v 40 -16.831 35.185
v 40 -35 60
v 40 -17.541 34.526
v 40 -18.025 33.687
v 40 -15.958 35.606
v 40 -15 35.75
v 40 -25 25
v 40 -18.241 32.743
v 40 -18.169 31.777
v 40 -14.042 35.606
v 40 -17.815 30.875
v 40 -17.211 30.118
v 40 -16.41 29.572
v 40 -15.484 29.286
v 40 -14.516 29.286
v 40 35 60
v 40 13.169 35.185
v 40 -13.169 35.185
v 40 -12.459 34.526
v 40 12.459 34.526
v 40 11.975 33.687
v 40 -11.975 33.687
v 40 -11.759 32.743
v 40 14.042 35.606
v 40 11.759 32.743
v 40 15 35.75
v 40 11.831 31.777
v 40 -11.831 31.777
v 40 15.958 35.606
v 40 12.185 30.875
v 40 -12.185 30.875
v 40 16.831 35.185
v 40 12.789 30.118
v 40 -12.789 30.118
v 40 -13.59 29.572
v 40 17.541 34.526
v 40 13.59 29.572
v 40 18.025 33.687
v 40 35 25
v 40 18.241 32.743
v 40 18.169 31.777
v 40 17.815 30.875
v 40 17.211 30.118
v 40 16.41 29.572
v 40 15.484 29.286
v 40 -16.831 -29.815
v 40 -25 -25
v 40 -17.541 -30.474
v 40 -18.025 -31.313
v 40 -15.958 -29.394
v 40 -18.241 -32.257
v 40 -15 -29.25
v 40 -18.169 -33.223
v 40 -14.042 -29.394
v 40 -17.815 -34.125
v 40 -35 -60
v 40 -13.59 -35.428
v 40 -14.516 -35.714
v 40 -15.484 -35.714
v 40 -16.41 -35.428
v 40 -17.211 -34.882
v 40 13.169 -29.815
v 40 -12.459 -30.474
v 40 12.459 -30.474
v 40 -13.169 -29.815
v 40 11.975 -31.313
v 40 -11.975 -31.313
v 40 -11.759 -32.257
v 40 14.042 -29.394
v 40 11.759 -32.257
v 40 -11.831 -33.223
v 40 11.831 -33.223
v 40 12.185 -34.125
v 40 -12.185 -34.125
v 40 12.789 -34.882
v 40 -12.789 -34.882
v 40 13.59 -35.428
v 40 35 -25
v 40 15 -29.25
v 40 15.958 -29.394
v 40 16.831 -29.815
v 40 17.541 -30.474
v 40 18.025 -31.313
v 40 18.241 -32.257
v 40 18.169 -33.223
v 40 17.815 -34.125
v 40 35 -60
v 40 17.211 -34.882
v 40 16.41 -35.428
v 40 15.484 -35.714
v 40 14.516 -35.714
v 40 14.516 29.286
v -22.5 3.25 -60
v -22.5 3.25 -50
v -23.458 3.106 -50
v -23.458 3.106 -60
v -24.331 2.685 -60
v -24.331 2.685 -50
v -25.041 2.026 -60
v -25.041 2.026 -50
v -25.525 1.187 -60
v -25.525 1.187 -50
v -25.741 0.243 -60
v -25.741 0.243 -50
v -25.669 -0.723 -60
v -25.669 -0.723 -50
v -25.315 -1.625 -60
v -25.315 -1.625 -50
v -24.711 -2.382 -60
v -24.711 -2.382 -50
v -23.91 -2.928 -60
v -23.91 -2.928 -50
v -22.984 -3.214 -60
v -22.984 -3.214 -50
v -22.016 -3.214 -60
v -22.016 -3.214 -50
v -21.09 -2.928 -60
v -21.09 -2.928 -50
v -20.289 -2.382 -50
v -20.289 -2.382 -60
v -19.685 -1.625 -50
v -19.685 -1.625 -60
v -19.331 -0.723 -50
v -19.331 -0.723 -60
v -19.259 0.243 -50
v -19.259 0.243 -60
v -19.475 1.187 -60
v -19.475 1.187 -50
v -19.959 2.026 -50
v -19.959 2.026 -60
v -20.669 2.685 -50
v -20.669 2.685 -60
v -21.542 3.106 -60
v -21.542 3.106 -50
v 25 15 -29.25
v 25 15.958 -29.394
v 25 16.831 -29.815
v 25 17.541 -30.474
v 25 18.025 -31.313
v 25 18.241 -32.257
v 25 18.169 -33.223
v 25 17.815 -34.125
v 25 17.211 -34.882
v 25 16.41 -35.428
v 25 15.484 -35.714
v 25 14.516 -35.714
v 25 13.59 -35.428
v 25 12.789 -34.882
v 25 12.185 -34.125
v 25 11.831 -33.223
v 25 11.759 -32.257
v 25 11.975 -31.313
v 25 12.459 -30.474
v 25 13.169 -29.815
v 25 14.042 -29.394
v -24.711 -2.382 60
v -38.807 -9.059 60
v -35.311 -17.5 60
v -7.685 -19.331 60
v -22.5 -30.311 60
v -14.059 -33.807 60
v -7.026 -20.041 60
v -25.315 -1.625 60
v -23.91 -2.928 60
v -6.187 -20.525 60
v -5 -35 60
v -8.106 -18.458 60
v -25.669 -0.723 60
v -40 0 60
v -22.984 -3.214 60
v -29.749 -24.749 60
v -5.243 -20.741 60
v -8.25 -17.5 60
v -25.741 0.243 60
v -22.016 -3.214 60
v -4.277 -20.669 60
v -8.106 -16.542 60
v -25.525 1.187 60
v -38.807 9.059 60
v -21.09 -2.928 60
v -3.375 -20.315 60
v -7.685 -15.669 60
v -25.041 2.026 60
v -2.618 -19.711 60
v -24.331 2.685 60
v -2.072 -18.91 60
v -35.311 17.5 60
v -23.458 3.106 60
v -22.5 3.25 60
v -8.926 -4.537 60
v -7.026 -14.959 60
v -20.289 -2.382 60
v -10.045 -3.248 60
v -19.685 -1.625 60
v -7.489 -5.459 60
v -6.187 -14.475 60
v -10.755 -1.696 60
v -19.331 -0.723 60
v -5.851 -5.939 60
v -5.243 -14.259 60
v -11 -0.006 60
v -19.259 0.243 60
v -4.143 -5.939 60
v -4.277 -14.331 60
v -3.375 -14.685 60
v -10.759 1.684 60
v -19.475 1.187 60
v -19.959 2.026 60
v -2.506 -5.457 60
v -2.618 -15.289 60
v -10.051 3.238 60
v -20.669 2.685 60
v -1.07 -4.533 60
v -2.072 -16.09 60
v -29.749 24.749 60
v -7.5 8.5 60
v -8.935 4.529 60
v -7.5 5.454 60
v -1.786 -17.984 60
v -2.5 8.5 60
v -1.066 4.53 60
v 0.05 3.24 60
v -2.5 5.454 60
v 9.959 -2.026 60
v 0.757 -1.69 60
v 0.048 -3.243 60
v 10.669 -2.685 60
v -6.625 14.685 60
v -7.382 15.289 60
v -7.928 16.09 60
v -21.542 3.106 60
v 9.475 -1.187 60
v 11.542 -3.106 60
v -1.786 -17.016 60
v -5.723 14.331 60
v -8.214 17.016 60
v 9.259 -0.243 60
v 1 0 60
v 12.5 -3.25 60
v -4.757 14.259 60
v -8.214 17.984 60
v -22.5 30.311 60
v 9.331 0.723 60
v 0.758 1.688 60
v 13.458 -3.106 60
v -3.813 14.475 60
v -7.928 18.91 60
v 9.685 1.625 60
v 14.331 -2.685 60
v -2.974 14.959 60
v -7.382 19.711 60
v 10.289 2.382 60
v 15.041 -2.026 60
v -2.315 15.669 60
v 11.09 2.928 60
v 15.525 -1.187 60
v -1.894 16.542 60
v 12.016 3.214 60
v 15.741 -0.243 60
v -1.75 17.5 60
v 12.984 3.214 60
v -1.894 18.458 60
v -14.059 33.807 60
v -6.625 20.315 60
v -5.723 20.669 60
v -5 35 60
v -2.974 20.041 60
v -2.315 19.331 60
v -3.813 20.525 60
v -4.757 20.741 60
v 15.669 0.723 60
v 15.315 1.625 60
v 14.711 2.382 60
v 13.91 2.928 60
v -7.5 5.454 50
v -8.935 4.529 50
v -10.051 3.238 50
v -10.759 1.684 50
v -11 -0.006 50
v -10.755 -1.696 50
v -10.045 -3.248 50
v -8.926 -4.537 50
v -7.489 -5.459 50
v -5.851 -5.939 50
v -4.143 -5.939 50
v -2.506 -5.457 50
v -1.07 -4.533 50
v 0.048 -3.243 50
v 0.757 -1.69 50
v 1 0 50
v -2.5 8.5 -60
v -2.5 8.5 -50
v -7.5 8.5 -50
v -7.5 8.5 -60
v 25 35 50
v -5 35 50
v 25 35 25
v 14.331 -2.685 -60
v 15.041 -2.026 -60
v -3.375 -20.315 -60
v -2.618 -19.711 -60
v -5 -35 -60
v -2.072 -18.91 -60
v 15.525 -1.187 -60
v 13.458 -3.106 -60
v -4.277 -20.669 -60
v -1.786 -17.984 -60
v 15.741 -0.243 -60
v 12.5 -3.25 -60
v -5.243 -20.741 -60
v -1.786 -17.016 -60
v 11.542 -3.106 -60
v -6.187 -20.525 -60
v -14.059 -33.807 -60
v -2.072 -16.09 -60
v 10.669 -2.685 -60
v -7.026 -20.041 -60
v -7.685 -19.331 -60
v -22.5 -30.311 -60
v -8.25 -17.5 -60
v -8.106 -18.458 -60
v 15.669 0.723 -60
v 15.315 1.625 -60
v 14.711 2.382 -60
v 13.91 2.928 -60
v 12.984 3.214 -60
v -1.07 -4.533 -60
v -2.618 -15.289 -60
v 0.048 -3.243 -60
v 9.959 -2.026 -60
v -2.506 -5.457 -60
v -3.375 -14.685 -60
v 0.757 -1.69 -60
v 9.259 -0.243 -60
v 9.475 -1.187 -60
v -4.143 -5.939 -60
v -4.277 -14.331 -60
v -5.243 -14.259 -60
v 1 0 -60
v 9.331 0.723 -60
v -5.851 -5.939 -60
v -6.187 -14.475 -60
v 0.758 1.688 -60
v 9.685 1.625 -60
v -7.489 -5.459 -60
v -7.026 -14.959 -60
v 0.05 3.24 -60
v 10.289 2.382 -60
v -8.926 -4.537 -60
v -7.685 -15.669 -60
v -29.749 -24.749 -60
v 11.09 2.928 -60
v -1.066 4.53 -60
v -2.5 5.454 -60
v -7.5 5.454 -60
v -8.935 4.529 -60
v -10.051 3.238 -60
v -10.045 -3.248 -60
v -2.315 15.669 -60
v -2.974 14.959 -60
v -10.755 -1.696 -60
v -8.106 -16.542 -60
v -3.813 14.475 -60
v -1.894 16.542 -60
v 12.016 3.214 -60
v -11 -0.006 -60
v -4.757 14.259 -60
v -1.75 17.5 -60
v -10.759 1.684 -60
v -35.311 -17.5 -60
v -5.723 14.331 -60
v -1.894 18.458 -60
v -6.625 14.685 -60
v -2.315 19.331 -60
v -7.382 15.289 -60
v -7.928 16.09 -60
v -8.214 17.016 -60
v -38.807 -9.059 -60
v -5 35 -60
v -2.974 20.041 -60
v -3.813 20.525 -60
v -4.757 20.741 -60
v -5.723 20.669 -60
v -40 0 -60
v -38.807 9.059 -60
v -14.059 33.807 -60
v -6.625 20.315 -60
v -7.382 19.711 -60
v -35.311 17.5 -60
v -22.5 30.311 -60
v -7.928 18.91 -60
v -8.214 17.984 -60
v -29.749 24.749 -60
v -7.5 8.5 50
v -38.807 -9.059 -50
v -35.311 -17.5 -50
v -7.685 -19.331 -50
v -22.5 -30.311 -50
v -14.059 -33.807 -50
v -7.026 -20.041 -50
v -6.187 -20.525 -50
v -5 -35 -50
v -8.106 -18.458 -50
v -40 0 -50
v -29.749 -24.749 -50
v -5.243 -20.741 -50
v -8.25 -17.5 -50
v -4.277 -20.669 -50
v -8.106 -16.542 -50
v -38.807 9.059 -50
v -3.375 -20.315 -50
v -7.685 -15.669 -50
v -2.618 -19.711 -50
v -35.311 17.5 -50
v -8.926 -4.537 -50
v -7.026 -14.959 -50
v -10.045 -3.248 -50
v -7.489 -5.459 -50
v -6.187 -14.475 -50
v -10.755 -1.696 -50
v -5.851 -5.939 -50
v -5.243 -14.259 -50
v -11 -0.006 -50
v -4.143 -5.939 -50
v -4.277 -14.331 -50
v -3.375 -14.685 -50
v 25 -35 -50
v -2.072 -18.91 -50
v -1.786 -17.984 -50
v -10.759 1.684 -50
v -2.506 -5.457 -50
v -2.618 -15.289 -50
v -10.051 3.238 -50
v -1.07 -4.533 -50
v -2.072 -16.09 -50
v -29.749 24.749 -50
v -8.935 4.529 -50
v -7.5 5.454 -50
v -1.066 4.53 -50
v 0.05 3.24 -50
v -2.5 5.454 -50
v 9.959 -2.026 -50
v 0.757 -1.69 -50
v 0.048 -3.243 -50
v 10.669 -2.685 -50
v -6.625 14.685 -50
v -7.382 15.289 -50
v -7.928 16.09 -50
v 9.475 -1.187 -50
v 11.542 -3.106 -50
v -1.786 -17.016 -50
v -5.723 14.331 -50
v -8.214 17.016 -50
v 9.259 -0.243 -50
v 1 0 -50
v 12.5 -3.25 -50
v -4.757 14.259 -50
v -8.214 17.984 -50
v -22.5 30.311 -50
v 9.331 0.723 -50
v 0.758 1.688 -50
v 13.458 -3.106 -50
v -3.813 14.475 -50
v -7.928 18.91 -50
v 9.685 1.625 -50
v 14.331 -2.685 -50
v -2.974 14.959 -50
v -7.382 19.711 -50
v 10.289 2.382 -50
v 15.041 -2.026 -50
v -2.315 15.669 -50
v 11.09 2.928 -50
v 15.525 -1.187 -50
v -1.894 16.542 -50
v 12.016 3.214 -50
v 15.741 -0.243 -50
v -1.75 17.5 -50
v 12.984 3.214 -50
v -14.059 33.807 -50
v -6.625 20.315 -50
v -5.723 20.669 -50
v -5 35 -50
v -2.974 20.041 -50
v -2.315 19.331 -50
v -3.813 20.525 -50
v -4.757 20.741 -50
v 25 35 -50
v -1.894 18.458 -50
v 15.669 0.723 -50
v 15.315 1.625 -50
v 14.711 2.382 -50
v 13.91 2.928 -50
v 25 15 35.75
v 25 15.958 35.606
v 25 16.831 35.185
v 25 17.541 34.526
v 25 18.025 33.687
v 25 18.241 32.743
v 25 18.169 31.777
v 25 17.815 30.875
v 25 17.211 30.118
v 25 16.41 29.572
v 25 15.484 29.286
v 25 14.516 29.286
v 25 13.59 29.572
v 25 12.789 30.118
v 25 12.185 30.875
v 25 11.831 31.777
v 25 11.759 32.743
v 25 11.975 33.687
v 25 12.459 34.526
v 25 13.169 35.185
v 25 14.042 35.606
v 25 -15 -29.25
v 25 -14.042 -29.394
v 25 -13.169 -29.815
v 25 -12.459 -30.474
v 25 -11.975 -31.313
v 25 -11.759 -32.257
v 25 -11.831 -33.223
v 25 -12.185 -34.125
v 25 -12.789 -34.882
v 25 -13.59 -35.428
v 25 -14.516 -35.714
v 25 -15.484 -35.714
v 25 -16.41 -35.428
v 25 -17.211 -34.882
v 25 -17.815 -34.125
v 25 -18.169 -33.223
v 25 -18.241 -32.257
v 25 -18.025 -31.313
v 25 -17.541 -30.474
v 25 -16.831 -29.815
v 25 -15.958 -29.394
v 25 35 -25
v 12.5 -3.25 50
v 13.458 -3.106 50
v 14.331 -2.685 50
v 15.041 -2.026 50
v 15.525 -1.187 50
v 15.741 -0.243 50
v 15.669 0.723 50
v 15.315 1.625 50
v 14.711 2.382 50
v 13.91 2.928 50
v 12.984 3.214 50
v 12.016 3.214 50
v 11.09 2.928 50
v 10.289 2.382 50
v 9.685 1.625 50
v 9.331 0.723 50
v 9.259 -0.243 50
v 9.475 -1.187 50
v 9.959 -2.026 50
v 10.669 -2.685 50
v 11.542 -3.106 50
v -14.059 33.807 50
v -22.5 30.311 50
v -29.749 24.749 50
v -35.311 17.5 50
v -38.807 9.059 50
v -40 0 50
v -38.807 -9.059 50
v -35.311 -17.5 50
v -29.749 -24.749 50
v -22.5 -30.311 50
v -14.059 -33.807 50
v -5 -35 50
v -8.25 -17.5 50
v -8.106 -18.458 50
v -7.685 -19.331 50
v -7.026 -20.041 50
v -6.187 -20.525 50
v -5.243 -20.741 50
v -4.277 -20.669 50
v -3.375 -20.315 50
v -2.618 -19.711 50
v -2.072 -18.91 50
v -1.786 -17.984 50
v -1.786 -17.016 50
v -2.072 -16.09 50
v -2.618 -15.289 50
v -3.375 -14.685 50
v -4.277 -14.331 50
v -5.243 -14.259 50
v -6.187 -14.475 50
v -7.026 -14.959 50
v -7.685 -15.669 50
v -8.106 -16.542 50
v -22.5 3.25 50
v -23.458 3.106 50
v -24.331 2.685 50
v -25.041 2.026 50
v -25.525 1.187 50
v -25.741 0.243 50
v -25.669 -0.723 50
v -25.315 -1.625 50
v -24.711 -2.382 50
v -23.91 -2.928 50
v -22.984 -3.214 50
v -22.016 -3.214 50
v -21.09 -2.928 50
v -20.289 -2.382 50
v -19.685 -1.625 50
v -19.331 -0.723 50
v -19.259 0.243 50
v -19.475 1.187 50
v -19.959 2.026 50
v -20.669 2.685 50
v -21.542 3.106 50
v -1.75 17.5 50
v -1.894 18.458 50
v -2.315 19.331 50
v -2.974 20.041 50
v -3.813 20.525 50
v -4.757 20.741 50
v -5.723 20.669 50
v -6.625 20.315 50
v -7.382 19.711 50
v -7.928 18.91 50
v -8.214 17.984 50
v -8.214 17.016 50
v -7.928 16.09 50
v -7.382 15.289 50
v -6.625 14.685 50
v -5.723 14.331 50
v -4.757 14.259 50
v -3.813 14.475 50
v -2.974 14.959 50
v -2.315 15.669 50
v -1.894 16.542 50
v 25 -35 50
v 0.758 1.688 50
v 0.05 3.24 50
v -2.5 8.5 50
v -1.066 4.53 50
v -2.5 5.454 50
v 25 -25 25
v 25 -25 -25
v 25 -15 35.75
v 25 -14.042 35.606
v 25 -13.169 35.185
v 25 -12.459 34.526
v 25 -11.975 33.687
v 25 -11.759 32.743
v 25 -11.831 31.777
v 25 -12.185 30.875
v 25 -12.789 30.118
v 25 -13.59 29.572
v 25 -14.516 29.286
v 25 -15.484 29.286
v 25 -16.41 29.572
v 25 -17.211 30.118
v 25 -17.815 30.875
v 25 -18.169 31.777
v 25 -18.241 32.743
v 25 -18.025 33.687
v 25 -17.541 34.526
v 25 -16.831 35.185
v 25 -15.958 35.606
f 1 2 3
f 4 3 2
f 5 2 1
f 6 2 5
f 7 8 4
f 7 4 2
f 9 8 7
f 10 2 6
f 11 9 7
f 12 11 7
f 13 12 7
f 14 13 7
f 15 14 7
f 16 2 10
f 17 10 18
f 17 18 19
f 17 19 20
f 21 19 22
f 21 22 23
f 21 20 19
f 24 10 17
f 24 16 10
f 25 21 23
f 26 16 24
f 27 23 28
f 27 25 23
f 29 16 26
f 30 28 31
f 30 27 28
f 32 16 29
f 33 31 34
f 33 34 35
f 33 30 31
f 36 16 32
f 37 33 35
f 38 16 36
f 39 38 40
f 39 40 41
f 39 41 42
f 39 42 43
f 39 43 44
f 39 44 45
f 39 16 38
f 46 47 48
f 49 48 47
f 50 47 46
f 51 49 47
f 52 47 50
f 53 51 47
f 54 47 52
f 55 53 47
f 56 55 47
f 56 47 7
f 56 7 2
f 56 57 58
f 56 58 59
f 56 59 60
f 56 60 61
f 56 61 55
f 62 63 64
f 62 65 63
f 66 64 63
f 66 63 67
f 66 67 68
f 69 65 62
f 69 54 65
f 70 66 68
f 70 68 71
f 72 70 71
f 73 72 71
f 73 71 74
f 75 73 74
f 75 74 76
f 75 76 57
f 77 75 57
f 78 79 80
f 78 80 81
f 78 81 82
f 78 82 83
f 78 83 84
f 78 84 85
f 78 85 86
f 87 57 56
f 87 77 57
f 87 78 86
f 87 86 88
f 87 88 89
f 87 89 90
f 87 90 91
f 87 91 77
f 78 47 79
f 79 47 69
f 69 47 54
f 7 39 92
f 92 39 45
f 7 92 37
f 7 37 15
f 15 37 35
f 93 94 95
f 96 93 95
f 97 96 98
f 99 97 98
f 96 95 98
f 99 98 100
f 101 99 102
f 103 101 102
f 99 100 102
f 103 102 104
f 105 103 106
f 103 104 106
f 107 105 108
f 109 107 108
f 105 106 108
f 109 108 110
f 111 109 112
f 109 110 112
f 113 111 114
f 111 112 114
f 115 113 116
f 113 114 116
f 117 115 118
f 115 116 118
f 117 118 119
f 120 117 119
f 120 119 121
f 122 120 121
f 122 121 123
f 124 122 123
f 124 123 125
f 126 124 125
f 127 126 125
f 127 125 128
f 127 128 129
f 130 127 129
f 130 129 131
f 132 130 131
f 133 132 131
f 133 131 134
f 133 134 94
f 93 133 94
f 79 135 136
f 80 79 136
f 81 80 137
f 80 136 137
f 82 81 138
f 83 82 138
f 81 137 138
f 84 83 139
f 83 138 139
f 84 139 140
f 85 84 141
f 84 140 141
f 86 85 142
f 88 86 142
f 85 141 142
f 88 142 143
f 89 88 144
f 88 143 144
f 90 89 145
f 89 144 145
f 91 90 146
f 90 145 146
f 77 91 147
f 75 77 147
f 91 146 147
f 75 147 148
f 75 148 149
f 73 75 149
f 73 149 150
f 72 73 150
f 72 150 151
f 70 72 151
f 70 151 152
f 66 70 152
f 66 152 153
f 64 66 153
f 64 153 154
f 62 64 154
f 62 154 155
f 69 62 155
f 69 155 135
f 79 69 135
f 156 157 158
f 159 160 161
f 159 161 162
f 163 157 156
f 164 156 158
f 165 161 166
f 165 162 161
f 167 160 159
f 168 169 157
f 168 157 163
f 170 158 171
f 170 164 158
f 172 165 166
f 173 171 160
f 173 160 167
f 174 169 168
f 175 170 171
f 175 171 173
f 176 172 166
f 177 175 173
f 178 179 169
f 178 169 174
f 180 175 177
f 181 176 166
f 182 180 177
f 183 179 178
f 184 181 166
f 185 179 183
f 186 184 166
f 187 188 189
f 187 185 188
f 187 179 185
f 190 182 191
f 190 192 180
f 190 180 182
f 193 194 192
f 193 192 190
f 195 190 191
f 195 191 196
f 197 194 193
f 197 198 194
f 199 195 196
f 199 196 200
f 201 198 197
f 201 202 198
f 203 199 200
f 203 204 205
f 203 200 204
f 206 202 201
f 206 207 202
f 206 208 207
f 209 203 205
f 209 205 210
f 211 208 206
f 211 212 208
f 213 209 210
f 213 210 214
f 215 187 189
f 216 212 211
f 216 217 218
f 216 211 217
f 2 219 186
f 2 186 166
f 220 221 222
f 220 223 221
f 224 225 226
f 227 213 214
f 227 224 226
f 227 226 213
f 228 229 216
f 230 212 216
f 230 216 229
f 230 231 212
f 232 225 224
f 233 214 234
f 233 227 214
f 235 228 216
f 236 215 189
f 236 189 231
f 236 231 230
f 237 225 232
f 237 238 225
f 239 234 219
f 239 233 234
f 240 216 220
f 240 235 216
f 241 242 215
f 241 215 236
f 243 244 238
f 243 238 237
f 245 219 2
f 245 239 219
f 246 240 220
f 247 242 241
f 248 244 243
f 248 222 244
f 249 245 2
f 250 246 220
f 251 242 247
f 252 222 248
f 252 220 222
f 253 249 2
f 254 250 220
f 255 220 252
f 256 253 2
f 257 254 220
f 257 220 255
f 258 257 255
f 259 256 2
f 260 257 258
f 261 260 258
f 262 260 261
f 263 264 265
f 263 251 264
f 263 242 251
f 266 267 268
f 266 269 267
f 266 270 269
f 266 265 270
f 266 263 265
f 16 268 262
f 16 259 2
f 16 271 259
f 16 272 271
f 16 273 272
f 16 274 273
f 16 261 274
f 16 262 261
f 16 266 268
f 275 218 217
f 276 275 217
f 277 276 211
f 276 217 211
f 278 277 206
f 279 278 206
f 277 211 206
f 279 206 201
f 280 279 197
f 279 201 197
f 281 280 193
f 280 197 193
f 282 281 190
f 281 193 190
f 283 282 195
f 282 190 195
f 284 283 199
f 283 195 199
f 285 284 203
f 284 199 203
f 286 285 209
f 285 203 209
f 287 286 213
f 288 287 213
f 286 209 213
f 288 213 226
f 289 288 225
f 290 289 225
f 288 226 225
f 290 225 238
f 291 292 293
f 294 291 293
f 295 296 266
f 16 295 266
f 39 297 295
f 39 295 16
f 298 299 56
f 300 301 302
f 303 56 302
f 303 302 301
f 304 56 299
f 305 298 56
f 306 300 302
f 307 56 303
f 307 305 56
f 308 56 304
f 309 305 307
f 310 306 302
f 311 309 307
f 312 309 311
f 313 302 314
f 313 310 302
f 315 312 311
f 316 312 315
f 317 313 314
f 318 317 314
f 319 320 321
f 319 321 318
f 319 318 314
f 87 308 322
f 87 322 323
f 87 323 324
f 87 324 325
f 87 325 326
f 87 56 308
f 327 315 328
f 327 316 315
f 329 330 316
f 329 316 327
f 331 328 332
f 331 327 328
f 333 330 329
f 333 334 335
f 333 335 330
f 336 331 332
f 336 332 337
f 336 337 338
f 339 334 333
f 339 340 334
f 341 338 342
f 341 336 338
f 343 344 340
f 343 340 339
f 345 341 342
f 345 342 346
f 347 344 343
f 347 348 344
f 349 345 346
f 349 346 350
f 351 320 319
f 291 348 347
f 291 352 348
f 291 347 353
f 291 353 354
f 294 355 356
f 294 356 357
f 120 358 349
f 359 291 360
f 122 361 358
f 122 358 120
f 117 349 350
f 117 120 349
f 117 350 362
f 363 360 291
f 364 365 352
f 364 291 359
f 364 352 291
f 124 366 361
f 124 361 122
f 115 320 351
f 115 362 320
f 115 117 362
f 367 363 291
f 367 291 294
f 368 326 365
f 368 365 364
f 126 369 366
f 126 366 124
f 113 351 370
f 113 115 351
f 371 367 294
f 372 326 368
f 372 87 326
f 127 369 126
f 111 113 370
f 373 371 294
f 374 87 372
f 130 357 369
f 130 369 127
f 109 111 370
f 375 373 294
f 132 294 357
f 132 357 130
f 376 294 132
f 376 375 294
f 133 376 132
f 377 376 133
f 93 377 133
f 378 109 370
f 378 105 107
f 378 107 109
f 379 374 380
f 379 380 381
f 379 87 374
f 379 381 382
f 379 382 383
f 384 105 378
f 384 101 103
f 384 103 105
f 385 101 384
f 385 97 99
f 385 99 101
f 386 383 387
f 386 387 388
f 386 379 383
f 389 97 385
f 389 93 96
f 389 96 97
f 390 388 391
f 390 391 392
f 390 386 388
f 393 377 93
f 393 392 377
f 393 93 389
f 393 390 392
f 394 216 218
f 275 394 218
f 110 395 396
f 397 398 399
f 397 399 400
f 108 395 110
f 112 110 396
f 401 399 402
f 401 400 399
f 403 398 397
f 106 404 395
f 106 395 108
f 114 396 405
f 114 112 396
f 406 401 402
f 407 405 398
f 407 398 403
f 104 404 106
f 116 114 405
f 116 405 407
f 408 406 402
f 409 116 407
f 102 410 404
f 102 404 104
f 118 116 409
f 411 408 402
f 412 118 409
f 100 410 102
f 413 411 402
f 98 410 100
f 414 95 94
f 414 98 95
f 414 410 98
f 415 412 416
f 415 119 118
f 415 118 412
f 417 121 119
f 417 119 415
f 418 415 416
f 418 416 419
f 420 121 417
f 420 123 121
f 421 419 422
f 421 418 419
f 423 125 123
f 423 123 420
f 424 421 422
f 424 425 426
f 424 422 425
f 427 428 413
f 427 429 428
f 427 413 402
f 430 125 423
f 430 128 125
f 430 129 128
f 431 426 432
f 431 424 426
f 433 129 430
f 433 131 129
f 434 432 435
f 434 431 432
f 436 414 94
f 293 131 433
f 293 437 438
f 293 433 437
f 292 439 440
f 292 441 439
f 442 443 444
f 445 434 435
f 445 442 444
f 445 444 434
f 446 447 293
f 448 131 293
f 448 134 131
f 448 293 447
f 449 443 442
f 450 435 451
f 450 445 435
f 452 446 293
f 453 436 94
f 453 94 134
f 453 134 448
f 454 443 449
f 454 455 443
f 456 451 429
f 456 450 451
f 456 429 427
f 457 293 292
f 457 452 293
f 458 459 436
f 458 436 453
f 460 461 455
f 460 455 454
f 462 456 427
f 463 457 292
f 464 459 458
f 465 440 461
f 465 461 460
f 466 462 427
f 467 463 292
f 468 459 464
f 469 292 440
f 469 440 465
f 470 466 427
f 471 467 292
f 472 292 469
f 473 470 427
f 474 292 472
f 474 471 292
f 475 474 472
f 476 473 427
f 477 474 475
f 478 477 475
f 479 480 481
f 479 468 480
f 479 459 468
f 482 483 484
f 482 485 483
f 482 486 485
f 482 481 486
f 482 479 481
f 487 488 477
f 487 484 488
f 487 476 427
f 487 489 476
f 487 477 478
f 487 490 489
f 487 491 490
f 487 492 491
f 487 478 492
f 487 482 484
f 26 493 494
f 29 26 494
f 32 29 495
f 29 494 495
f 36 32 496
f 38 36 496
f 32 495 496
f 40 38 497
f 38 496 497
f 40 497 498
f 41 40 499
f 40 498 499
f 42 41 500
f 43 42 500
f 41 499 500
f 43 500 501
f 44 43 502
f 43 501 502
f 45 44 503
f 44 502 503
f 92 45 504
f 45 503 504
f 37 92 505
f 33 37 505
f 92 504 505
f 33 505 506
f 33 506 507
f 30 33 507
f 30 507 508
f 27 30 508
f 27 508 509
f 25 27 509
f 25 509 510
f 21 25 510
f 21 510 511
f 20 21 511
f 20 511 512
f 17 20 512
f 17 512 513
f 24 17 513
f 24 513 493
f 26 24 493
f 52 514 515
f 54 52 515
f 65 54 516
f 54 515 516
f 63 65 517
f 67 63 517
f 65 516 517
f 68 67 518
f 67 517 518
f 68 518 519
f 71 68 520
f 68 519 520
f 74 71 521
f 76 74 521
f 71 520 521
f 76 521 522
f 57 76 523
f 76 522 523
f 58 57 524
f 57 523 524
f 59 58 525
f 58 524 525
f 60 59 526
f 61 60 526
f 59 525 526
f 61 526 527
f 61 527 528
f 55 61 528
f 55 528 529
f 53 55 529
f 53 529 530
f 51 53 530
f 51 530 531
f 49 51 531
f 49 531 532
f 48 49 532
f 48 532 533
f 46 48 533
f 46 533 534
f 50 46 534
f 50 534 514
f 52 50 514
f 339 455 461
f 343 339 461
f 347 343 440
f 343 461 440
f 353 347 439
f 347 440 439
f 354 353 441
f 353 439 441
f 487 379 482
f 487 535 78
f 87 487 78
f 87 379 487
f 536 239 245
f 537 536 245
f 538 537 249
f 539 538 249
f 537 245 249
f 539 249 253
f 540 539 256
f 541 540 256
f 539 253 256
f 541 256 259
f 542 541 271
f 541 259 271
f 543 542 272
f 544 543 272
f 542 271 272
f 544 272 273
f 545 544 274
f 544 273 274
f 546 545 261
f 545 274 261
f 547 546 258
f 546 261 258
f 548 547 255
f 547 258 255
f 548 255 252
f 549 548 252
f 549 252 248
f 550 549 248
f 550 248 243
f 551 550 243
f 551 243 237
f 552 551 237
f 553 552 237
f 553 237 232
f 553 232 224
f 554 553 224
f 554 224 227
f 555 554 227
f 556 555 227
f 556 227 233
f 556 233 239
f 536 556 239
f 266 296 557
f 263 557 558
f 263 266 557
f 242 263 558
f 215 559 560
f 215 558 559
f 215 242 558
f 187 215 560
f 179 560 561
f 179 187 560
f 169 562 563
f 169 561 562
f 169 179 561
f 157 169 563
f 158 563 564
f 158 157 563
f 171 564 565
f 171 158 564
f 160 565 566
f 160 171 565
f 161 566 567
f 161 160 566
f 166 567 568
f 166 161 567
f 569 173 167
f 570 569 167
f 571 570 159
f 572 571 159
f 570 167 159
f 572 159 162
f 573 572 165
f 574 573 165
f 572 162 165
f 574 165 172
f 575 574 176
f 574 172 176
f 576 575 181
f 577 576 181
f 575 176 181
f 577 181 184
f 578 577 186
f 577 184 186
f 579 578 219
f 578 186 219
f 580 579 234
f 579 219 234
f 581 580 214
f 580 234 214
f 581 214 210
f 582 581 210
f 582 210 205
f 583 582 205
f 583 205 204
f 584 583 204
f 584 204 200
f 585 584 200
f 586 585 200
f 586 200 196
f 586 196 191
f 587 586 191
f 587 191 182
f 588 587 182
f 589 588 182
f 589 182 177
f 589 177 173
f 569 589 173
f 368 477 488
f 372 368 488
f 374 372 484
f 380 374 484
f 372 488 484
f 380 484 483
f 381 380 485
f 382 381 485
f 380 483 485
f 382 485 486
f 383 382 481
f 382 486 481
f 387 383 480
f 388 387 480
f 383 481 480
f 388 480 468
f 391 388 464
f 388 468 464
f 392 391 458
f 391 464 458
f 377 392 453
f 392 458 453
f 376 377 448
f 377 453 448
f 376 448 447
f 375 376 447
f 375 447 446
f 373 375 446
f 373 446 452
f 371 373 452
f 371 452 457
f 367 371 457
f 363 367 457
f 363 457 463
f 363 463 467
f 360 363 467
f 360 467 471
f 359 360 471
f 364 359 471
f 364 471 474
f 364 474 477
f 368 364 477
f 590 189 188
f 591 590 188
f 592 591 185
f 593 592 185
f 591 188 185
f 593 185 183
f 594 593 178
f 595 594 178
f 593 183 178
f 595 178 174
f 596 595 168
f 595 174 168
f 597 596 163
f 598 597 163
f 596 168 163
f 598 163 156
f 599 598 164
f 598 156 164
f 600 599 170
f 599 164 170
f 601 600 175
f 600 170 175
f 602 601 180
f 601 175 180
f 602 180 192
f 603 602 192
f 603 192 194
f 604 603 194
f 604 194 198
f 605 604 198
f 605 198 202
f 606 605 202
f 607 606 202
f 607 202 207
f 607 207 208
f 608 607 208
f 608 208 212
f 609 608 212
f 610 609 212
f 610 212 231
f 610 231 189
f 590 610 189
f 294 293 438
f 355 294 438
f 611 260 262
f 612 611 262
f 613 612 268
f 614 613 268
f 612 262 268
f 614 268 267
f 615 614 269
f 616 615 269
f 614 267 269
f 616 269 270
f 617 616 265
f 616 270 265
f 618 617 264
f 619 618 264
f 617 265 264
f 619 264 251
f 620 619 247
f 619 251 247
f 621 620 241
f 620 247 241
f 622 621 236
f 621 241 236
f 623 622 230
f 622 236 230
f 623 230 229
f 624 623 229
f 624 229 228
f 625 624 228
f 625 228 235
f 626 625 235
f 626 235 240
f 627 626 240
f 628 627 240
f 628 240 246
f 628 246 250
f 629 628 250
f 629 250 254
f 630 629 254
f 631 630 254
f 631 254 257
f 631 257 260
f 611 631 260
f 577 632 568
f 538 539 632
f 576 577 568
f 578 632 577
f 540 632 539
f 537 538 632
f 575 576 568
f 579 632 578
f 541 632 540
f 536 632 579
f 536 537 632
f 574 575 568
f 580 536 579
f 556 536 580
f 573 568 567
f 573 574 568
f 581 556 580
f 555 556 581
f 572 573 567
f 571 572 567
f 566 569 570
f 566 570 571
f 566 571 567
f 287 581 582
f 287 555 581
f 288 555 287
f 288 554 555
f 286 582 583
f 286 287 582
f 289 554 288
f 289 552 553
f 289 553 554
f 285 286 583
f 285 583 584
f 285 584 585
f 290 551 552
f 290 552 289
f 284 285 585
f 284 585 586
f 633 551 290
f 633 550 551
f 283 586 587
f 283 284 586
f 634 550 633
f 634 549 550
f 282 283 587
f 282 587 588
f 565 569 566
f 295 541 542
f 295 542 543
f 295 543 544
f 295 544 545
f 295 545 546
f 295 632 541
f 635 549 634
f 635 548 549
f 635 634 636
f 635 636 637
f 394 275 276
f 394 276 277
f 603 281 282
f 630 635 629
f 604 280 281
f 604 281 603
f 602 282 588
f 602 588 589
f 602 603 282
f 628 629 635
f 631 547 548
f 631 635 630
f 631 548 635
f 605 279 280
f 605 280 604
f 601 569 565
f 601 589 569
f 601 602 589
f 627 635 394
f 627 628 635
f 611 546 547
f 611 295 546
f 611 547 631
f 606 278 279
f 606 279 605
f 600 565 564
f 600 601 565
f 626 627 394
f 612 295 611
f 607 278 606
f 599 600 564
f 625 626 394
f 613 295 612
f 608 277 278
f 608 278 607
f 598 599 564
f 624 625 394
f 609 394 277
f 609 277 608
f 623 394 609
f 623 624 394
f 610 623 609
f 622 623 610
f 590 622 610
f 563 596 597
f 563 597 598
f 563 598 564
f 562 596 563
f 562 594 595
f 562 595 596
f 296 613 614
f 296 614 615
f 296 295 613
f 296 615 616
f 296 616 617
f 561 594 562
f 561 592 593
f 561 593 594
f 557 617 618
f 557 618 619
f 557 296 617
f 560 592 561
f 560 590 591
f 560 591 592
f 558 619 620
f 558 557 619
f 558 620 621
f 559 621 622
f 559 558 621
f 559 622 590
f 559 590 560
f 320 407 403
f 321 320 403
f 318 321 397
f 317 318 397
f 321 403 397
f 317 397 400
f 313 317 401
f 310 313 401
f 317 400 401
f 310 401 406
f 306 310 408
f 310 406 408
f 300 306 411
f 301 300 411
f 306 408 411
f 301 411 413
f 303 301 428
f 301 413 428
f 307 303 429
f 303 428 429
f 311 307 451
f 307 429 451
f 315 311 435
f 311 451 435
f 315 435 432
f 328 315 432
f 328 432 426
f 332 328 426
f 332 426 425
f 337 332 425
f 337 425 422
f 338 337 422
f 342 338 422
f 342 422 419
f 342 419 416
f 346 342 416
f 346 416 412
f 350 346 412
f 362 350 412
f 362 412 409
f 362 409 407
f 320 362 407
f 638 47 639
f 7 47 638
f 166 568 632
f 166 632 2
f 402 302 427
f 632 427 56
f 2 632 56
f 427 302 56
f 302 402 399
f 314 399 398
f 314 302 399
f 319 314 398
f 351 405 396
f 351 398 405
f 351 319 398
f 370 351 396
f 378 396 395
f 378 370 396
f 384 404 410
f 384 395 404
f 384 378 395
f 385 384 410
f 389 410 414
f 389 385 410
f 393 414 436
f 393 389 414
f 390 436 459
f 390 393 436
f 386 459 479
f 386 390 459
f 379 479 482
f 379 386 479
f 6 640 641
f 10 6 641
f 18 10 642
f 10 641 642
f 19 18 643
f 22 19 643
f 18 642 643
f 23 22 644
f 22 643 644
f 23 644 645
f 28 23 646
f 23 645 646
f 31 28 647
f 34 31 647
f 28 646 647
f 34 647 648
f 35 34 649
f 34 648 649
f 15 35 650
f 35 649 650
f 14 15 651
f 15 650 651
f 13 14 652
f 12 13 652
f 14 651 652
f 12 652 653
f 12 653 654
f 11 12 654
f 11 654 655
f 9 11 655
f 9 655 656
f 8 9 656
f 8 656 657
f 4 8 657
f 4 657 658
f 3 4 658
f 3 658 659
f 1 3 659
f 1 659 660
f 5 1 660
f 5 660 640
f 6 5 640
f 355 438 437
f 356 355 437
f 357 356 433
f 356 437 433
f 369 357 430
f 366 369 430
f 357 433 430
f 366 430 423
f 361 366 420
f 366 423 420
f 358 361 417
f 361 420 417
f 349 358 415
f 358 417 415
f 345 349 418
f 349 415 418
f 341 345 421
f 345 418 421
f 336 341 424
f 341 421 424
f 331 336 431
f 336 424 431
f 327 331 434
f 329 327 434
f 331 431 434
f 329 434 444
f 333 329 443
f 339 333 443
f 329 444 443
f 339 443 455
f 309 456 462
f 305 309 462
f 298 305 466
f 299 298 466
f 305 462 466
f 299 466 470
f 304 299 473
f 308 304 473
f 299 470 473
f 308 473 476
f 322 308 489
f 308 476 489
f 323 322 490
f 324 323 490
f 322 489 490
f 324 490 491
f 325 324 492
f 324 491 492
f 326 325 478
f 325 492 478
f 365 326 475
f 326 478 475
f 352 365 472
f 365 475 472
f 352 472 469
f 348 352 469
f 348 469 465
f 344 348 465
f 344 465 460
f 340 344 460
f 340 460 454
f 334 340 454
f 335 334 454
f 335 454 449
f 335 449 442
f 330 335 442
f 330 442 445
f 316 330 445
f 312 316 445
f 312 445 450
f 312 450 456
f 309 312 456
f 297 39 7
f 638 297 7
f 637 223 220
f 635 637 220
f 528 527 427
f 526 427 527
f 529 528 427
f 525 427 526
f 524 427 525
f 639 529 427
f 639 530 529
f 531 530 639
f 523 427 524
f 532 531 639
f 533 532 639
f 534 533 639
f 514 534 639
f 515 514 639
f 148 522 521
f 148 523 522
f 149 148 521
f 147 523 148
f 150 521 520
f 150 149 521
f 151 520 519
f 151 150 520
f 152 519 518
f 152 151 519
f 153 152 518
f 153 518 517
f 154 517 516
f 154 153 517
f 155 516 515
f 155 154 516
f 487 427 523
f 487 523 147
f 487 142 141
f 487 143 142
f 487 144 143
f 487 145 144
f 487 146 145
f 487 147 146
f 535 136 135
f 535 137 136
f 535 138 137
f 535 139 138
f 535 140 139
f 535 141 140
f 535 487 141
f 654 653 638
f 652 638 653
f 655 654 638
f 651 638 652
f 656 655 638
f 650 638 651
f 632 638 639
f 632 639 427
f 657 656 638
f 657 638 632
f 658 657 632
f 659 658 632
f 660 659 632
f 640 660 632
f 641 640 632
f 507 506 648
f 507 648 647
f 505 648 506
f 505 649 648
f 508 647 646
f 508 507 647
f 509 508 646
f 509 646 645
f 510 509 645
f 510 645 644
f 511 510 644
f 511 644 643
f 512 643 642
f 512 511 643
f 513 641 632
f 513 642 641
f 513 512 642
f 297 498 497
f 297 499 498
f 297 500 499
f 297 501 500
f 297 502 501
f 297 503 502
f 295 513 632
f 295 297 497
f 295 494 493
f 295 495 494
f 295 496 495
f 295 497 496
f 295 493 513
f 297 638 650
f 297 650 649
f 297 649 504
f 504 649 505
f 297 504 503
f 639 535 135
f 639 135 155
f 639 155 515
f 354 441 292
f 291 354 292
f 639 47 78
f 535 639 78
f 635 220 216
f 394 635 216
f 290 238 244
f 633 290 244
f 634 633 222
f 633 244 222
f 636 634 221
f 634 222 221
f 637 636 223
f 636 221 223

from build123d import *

# Parameters (mm, degrees)
BOSS_EXTRUDE1_DEPTH = 35
FILLET1_RADIUS      = 35
FILLET1_LENGTH      = 10
FILLET2_RADIUS      = 35
FILLET2_LENGTH      = 10
CUT_EXTRUDE1_DEPTH  = 132.244047484
SKETCH4_R           = 3.25
CUT_EXTRUDE2_DEPTH  = 132.244047484
CIRPATTERN1_COUNT   = 4
CUT_EXTRUDE3_DEPTH  = 106.948100502
SKETCH6_R           = 3.25
CUT_EXTRUDE4_DEPTH  = 23


with BuildPart() as part:
    # Sketch1 → Boss-Extrude1 (new, symmetric)
    with BuildSketch(Plane(origin=(0, 0, 0), x_dir=(1, 0, 0), z_dir=(0, 1, 0))):
        Polygon((25, -50), (-40, -50), (-40, -60), (40, -60), (40, 60), (-40, 60), (-40, 50), (25, 50), align=None)
    extrude(amount=BOSS_EXTRUDE1_DEPTH, both=True)

    # Fillet1: full round fillet: the end face becomes a half cylinder, R = half its width
    fillet1_face = Plane((-40, 0, 55), x_dir=(0, 0, 1), z_dir=(-1, 0, 0))  # on the end face: x along it, z out of the body
    fillet1_slab = fillet1_face.offset(-FILLET1_RADIUS / 2) * Box(FILLET1_LENGTH, 2 * FILLET1_RADIUS, FILLET1_RADIUS, mode=Mode.PRIVATE)  # the body's end, R deep
    fillet1_round = Plane((-5, 0, 55), x_dir=(-1, 0, 0), z_dir=(0, 0, 1)) * Cylinder(FILLET1_RADIUS, FILLET1_LENGTH, mode=Mode.PRIVATE)  # its axis R under the face
    add(fillet1_slab - fillet1_round, mode=Mode.SUBTRACT)

    # Fillet2: full round fillet: the end face becomes a half cylinder, R = half its width
    fillet2_face = Plane((-40, 0, -55), x_dir=(0, 0, -1), z_dir=(-1, 0, 0))  # on the end face: x along it, z out of the body
    fillet2_slab = fillet2_face.offset(-FILLET2_RADIUS / 2) * Box(FILLET2_LENGTH, 2 * FILLET2_RADIUS, FILLET2_RADIUS, mode=Mode.PRIVATE)  # the body's end, R deep
    fillet2_round = Plane((-5, 0, -55), x_dir=(-1, 0, 0), z_dir=(0, 0, -1)) * Cylinder(FILLET2_RADIUS, FILLET2_LENGTH, mode=Mode.PRIVATE)  # its axis R under the face
    add(fillet2_slab - fillet2_round, mode=Mode.SUBTRACT)

    # Sketch2 → Cut-Extrude1 (cut, through all)
    with BuildSketch(Plane.XY.offset(60)):
        with BuildLine():
            Line((-2.5, 8.5), (-7.5, 8.5))
            Line((-7.5, 8.5), (-7.5, 5.454356057))
            ThreePointArc((-7.5, 5.454356057), (-5, 6), (-2.5, 5.454356057))
            Line((-2.5, 5.454356057), (-2.5, 8.5))
        make_face()
        with BuildLine():
            ThreePointArc((-2.5, 5.454356057), (-5, 6), (-7.5, 5.454356057))
            Line((-7.5, 5.454356057), (-7.5, 3.5))
            Line((-7.5, 3.5), (-2.5, 3.5))
            Line((-2.5, 3.5), (-2.5, 5.454356057))
        make_face()
        with BuildLine():
            Line((-7.5, 3.5), (-7.5, 5.454356057))
            ThreePointArc((-7.5, 5.454356057), (-8.240370349, -5.049752469), (1, 0))
            ThreePointArc((1, 0), (0.049752469, 3.240370349), (-2.5, 5.454356057))
            Line((-2.5, 5.454356057), (-2.5, 3.5))
            Line((-2.5, 3.5), (-7.5, 3.5))
        make_face()
    extrude(amount=-CUT_EXTRUDE1_DEPTH, mode=Mode.SUBTRACT)

    # Sketch4 → Cut-Extrude2 (cut, through all)
    with BuildSketch(Plane.XY.offset(60)):
        with Locations((-5, 17.5)):
            Circle(SKETCH4_R)
    cut_extrude2 = extrude(amount=-CUT_EXTRUDE2_DEPTH, mode=Mode.SUBTRACT)

    # CirPattern1: Cut-Extrude2 ×4 about axis
    cirpattern1_axis = Axis((-5, 0, 0), (0, 0, 1))
    for i in range(1, CIRPATTERN1_COUNT):
        add(cut_extrude2.rotate(cirpattern1_axis, i * 360 / CIRPATTERN1_COUNT), mode=Mode.SUBTRACT)

    # Sketch5 → Cut-Extrude3 (cut, through all)
    with BuildSketch(Plane(origin=(40, 0, 0), x_dir=(0, 0, -1), z_dir=(1, 0, 0))):
        Polygon((-25, 25), (-25, 35), (25, 35), (25, 25), (25, -25), (-25, -25), align=None)
    extrude(amount=-CUT_EXTRUDE3_DEPTH, mode=Mode.SUBTRACT)

    # Sketch6 → Cut-Extrude4 (cut)
    with BuildSketch(Plane.ZY.offset(-25)):
        with Locations((-32.5, 15)):
            Circle(SKETCH6_R)
        with Locations((-32.5, -15)):
            Circle(SKETCH6_R)
        with Locations((32.5, -15)):
            Circle(SKETCH6_R)
        with Locations((32.5, 15)):
            Circle(SKETCH6_R)
    extrude(amount=-CUT_EXTRUDE4_DEPTH, mode=Mode.SUBTRACT)


solid = part.part
